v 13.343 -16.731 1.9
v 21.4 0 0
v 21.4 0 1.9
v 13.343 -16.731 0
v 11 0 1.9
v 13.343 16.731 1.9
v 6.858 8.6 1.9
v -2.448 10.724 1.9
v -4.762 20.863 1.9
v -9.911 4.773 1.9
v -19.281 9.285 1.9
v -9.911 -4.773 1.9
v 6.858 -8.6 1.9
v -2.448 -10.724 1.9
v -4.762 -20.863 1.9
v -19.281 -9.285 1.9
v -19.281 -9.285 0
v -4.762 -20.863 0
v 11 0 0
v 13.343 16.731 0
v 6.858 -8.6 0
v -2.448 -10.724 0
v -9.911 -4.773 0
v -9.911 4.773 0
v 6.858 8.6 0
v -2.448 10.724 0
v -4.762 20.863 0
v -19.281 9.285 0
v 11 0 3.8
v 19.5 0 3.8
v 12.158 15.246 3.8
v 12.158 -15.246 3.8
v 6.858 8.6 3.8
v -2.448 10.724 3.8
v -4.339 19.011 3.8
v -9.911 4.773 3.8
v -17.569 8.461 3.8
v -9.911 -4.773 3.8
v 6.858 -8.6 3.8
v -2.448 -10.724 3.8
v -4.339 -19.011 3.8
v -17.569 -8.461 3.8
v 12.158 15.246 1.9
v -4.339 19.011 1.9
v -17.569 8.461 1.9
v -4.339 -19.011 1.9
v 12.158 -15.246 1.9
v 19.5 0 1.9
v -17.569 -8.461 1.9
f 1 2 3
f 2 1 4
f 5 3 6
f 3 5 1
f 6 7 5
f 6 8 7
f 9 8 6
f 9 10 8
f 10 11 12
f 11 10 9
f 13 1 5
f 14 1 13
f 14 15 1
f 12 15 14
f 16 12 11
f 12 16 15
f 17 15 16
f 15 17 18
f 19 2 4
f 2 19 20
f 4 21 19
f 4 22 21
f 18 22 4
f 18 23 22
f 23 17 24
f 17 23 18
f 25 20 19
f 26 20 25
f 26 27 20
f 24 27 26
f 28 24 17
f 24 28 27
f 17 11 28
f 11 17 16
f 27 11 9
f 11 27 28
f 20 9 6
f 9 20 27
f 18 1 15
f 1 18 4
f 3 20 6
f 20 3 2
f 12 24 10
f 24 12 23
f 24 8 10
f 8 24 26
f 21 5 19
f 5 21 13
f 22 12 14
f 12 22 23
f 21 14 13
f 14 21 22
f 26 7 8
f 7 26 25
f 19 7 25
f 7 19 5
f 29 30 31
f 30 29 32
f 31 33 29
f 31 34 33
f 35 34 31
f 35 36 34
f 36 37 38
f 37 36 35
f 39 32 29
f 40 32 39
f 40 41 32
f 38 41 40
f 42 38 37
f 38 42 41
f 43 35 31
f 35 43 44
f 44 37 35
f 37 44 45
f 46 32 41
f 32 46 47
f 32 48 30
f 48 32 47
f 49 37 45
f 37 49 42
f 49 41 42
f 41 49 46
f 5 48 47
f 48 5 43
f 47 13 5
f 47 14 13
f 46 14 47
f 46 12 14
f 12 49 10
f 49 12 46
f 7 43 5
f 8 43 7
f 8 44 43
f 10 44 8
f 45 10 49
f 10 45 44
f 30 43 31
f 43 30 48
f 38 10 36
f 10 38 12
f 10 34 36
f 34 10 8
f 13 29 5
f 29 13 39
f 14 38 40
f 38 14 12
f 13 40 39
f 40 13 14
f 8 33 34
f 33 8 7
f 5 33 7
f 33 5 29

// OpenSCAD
// file: measurements.scad
thickness = 1.9;
finger_d = 22;

module holder(h) {
    // Child 0 is the outer shape
    // Child 1 is the inner shape
    // Child 2 is the end-cap hole shape
    // Bottom end
    difference() {
        linear_extrude(thickness) { children(0); }
        translate([0, 0, -1])
            linear_extrude(thickness+2) { children(2); }
    }
    // Main chamber: h + thickness to leave room for the lid.
    translate([0, 0, thickness])
        difference() {
            linear_extrude(h + thickness) { children(0); }
            translate([0, 0, -1])
                linear_extrude(h + thickness + 2) { children(1); }
        }
}

module lid() {
    // Child 0 is the outer shape
    // Child 1 is the inner shape
    // Child 2 is the end-cap hole shape
    // Bottom end
    difference() {
        linear_extrude(thickness) { children(0); }
        translate([0, 0, -1])
            linear_extrude(thickness+2) { children(2); }
    }
    // Cap plug
    translate([0, 0, thickness])
        difference() {
            linear_extrude(thickness) { children(1); }
            translate([0, 0, -1])
                linear_extrude(thickness+2) { children(2); }
        }
}

//
// Discovery Tiles
//

discovery_w = 24;
discovery_count = 21;

function discovery_corner_r(w) = w * 7 / 24;

module discovery_tile_shape(w) {
    r = discovery_corner_r(w);
    translate([-w/2, -w/2]) {
        translate([w-r, w-r])
            circle(r=r, $fn=64);
        square([w-r, w]);
        square([w, w-r]);
    }
}

//
// Ancients
//

ancient_r = 19.5;
ancient_count = 22;

//
// Monotliths/Orbitals
//

monolith_orbital_d = 25.25;
monolith_orbital_count = 22;
// main file
include <measurements.scad>

lid() {
    circle(r=ancient_r+thickness, $fn=7);
    circle(r=ancient_r, $fn=7);
    circle(r=finger_d/2, $fn=7);
}
